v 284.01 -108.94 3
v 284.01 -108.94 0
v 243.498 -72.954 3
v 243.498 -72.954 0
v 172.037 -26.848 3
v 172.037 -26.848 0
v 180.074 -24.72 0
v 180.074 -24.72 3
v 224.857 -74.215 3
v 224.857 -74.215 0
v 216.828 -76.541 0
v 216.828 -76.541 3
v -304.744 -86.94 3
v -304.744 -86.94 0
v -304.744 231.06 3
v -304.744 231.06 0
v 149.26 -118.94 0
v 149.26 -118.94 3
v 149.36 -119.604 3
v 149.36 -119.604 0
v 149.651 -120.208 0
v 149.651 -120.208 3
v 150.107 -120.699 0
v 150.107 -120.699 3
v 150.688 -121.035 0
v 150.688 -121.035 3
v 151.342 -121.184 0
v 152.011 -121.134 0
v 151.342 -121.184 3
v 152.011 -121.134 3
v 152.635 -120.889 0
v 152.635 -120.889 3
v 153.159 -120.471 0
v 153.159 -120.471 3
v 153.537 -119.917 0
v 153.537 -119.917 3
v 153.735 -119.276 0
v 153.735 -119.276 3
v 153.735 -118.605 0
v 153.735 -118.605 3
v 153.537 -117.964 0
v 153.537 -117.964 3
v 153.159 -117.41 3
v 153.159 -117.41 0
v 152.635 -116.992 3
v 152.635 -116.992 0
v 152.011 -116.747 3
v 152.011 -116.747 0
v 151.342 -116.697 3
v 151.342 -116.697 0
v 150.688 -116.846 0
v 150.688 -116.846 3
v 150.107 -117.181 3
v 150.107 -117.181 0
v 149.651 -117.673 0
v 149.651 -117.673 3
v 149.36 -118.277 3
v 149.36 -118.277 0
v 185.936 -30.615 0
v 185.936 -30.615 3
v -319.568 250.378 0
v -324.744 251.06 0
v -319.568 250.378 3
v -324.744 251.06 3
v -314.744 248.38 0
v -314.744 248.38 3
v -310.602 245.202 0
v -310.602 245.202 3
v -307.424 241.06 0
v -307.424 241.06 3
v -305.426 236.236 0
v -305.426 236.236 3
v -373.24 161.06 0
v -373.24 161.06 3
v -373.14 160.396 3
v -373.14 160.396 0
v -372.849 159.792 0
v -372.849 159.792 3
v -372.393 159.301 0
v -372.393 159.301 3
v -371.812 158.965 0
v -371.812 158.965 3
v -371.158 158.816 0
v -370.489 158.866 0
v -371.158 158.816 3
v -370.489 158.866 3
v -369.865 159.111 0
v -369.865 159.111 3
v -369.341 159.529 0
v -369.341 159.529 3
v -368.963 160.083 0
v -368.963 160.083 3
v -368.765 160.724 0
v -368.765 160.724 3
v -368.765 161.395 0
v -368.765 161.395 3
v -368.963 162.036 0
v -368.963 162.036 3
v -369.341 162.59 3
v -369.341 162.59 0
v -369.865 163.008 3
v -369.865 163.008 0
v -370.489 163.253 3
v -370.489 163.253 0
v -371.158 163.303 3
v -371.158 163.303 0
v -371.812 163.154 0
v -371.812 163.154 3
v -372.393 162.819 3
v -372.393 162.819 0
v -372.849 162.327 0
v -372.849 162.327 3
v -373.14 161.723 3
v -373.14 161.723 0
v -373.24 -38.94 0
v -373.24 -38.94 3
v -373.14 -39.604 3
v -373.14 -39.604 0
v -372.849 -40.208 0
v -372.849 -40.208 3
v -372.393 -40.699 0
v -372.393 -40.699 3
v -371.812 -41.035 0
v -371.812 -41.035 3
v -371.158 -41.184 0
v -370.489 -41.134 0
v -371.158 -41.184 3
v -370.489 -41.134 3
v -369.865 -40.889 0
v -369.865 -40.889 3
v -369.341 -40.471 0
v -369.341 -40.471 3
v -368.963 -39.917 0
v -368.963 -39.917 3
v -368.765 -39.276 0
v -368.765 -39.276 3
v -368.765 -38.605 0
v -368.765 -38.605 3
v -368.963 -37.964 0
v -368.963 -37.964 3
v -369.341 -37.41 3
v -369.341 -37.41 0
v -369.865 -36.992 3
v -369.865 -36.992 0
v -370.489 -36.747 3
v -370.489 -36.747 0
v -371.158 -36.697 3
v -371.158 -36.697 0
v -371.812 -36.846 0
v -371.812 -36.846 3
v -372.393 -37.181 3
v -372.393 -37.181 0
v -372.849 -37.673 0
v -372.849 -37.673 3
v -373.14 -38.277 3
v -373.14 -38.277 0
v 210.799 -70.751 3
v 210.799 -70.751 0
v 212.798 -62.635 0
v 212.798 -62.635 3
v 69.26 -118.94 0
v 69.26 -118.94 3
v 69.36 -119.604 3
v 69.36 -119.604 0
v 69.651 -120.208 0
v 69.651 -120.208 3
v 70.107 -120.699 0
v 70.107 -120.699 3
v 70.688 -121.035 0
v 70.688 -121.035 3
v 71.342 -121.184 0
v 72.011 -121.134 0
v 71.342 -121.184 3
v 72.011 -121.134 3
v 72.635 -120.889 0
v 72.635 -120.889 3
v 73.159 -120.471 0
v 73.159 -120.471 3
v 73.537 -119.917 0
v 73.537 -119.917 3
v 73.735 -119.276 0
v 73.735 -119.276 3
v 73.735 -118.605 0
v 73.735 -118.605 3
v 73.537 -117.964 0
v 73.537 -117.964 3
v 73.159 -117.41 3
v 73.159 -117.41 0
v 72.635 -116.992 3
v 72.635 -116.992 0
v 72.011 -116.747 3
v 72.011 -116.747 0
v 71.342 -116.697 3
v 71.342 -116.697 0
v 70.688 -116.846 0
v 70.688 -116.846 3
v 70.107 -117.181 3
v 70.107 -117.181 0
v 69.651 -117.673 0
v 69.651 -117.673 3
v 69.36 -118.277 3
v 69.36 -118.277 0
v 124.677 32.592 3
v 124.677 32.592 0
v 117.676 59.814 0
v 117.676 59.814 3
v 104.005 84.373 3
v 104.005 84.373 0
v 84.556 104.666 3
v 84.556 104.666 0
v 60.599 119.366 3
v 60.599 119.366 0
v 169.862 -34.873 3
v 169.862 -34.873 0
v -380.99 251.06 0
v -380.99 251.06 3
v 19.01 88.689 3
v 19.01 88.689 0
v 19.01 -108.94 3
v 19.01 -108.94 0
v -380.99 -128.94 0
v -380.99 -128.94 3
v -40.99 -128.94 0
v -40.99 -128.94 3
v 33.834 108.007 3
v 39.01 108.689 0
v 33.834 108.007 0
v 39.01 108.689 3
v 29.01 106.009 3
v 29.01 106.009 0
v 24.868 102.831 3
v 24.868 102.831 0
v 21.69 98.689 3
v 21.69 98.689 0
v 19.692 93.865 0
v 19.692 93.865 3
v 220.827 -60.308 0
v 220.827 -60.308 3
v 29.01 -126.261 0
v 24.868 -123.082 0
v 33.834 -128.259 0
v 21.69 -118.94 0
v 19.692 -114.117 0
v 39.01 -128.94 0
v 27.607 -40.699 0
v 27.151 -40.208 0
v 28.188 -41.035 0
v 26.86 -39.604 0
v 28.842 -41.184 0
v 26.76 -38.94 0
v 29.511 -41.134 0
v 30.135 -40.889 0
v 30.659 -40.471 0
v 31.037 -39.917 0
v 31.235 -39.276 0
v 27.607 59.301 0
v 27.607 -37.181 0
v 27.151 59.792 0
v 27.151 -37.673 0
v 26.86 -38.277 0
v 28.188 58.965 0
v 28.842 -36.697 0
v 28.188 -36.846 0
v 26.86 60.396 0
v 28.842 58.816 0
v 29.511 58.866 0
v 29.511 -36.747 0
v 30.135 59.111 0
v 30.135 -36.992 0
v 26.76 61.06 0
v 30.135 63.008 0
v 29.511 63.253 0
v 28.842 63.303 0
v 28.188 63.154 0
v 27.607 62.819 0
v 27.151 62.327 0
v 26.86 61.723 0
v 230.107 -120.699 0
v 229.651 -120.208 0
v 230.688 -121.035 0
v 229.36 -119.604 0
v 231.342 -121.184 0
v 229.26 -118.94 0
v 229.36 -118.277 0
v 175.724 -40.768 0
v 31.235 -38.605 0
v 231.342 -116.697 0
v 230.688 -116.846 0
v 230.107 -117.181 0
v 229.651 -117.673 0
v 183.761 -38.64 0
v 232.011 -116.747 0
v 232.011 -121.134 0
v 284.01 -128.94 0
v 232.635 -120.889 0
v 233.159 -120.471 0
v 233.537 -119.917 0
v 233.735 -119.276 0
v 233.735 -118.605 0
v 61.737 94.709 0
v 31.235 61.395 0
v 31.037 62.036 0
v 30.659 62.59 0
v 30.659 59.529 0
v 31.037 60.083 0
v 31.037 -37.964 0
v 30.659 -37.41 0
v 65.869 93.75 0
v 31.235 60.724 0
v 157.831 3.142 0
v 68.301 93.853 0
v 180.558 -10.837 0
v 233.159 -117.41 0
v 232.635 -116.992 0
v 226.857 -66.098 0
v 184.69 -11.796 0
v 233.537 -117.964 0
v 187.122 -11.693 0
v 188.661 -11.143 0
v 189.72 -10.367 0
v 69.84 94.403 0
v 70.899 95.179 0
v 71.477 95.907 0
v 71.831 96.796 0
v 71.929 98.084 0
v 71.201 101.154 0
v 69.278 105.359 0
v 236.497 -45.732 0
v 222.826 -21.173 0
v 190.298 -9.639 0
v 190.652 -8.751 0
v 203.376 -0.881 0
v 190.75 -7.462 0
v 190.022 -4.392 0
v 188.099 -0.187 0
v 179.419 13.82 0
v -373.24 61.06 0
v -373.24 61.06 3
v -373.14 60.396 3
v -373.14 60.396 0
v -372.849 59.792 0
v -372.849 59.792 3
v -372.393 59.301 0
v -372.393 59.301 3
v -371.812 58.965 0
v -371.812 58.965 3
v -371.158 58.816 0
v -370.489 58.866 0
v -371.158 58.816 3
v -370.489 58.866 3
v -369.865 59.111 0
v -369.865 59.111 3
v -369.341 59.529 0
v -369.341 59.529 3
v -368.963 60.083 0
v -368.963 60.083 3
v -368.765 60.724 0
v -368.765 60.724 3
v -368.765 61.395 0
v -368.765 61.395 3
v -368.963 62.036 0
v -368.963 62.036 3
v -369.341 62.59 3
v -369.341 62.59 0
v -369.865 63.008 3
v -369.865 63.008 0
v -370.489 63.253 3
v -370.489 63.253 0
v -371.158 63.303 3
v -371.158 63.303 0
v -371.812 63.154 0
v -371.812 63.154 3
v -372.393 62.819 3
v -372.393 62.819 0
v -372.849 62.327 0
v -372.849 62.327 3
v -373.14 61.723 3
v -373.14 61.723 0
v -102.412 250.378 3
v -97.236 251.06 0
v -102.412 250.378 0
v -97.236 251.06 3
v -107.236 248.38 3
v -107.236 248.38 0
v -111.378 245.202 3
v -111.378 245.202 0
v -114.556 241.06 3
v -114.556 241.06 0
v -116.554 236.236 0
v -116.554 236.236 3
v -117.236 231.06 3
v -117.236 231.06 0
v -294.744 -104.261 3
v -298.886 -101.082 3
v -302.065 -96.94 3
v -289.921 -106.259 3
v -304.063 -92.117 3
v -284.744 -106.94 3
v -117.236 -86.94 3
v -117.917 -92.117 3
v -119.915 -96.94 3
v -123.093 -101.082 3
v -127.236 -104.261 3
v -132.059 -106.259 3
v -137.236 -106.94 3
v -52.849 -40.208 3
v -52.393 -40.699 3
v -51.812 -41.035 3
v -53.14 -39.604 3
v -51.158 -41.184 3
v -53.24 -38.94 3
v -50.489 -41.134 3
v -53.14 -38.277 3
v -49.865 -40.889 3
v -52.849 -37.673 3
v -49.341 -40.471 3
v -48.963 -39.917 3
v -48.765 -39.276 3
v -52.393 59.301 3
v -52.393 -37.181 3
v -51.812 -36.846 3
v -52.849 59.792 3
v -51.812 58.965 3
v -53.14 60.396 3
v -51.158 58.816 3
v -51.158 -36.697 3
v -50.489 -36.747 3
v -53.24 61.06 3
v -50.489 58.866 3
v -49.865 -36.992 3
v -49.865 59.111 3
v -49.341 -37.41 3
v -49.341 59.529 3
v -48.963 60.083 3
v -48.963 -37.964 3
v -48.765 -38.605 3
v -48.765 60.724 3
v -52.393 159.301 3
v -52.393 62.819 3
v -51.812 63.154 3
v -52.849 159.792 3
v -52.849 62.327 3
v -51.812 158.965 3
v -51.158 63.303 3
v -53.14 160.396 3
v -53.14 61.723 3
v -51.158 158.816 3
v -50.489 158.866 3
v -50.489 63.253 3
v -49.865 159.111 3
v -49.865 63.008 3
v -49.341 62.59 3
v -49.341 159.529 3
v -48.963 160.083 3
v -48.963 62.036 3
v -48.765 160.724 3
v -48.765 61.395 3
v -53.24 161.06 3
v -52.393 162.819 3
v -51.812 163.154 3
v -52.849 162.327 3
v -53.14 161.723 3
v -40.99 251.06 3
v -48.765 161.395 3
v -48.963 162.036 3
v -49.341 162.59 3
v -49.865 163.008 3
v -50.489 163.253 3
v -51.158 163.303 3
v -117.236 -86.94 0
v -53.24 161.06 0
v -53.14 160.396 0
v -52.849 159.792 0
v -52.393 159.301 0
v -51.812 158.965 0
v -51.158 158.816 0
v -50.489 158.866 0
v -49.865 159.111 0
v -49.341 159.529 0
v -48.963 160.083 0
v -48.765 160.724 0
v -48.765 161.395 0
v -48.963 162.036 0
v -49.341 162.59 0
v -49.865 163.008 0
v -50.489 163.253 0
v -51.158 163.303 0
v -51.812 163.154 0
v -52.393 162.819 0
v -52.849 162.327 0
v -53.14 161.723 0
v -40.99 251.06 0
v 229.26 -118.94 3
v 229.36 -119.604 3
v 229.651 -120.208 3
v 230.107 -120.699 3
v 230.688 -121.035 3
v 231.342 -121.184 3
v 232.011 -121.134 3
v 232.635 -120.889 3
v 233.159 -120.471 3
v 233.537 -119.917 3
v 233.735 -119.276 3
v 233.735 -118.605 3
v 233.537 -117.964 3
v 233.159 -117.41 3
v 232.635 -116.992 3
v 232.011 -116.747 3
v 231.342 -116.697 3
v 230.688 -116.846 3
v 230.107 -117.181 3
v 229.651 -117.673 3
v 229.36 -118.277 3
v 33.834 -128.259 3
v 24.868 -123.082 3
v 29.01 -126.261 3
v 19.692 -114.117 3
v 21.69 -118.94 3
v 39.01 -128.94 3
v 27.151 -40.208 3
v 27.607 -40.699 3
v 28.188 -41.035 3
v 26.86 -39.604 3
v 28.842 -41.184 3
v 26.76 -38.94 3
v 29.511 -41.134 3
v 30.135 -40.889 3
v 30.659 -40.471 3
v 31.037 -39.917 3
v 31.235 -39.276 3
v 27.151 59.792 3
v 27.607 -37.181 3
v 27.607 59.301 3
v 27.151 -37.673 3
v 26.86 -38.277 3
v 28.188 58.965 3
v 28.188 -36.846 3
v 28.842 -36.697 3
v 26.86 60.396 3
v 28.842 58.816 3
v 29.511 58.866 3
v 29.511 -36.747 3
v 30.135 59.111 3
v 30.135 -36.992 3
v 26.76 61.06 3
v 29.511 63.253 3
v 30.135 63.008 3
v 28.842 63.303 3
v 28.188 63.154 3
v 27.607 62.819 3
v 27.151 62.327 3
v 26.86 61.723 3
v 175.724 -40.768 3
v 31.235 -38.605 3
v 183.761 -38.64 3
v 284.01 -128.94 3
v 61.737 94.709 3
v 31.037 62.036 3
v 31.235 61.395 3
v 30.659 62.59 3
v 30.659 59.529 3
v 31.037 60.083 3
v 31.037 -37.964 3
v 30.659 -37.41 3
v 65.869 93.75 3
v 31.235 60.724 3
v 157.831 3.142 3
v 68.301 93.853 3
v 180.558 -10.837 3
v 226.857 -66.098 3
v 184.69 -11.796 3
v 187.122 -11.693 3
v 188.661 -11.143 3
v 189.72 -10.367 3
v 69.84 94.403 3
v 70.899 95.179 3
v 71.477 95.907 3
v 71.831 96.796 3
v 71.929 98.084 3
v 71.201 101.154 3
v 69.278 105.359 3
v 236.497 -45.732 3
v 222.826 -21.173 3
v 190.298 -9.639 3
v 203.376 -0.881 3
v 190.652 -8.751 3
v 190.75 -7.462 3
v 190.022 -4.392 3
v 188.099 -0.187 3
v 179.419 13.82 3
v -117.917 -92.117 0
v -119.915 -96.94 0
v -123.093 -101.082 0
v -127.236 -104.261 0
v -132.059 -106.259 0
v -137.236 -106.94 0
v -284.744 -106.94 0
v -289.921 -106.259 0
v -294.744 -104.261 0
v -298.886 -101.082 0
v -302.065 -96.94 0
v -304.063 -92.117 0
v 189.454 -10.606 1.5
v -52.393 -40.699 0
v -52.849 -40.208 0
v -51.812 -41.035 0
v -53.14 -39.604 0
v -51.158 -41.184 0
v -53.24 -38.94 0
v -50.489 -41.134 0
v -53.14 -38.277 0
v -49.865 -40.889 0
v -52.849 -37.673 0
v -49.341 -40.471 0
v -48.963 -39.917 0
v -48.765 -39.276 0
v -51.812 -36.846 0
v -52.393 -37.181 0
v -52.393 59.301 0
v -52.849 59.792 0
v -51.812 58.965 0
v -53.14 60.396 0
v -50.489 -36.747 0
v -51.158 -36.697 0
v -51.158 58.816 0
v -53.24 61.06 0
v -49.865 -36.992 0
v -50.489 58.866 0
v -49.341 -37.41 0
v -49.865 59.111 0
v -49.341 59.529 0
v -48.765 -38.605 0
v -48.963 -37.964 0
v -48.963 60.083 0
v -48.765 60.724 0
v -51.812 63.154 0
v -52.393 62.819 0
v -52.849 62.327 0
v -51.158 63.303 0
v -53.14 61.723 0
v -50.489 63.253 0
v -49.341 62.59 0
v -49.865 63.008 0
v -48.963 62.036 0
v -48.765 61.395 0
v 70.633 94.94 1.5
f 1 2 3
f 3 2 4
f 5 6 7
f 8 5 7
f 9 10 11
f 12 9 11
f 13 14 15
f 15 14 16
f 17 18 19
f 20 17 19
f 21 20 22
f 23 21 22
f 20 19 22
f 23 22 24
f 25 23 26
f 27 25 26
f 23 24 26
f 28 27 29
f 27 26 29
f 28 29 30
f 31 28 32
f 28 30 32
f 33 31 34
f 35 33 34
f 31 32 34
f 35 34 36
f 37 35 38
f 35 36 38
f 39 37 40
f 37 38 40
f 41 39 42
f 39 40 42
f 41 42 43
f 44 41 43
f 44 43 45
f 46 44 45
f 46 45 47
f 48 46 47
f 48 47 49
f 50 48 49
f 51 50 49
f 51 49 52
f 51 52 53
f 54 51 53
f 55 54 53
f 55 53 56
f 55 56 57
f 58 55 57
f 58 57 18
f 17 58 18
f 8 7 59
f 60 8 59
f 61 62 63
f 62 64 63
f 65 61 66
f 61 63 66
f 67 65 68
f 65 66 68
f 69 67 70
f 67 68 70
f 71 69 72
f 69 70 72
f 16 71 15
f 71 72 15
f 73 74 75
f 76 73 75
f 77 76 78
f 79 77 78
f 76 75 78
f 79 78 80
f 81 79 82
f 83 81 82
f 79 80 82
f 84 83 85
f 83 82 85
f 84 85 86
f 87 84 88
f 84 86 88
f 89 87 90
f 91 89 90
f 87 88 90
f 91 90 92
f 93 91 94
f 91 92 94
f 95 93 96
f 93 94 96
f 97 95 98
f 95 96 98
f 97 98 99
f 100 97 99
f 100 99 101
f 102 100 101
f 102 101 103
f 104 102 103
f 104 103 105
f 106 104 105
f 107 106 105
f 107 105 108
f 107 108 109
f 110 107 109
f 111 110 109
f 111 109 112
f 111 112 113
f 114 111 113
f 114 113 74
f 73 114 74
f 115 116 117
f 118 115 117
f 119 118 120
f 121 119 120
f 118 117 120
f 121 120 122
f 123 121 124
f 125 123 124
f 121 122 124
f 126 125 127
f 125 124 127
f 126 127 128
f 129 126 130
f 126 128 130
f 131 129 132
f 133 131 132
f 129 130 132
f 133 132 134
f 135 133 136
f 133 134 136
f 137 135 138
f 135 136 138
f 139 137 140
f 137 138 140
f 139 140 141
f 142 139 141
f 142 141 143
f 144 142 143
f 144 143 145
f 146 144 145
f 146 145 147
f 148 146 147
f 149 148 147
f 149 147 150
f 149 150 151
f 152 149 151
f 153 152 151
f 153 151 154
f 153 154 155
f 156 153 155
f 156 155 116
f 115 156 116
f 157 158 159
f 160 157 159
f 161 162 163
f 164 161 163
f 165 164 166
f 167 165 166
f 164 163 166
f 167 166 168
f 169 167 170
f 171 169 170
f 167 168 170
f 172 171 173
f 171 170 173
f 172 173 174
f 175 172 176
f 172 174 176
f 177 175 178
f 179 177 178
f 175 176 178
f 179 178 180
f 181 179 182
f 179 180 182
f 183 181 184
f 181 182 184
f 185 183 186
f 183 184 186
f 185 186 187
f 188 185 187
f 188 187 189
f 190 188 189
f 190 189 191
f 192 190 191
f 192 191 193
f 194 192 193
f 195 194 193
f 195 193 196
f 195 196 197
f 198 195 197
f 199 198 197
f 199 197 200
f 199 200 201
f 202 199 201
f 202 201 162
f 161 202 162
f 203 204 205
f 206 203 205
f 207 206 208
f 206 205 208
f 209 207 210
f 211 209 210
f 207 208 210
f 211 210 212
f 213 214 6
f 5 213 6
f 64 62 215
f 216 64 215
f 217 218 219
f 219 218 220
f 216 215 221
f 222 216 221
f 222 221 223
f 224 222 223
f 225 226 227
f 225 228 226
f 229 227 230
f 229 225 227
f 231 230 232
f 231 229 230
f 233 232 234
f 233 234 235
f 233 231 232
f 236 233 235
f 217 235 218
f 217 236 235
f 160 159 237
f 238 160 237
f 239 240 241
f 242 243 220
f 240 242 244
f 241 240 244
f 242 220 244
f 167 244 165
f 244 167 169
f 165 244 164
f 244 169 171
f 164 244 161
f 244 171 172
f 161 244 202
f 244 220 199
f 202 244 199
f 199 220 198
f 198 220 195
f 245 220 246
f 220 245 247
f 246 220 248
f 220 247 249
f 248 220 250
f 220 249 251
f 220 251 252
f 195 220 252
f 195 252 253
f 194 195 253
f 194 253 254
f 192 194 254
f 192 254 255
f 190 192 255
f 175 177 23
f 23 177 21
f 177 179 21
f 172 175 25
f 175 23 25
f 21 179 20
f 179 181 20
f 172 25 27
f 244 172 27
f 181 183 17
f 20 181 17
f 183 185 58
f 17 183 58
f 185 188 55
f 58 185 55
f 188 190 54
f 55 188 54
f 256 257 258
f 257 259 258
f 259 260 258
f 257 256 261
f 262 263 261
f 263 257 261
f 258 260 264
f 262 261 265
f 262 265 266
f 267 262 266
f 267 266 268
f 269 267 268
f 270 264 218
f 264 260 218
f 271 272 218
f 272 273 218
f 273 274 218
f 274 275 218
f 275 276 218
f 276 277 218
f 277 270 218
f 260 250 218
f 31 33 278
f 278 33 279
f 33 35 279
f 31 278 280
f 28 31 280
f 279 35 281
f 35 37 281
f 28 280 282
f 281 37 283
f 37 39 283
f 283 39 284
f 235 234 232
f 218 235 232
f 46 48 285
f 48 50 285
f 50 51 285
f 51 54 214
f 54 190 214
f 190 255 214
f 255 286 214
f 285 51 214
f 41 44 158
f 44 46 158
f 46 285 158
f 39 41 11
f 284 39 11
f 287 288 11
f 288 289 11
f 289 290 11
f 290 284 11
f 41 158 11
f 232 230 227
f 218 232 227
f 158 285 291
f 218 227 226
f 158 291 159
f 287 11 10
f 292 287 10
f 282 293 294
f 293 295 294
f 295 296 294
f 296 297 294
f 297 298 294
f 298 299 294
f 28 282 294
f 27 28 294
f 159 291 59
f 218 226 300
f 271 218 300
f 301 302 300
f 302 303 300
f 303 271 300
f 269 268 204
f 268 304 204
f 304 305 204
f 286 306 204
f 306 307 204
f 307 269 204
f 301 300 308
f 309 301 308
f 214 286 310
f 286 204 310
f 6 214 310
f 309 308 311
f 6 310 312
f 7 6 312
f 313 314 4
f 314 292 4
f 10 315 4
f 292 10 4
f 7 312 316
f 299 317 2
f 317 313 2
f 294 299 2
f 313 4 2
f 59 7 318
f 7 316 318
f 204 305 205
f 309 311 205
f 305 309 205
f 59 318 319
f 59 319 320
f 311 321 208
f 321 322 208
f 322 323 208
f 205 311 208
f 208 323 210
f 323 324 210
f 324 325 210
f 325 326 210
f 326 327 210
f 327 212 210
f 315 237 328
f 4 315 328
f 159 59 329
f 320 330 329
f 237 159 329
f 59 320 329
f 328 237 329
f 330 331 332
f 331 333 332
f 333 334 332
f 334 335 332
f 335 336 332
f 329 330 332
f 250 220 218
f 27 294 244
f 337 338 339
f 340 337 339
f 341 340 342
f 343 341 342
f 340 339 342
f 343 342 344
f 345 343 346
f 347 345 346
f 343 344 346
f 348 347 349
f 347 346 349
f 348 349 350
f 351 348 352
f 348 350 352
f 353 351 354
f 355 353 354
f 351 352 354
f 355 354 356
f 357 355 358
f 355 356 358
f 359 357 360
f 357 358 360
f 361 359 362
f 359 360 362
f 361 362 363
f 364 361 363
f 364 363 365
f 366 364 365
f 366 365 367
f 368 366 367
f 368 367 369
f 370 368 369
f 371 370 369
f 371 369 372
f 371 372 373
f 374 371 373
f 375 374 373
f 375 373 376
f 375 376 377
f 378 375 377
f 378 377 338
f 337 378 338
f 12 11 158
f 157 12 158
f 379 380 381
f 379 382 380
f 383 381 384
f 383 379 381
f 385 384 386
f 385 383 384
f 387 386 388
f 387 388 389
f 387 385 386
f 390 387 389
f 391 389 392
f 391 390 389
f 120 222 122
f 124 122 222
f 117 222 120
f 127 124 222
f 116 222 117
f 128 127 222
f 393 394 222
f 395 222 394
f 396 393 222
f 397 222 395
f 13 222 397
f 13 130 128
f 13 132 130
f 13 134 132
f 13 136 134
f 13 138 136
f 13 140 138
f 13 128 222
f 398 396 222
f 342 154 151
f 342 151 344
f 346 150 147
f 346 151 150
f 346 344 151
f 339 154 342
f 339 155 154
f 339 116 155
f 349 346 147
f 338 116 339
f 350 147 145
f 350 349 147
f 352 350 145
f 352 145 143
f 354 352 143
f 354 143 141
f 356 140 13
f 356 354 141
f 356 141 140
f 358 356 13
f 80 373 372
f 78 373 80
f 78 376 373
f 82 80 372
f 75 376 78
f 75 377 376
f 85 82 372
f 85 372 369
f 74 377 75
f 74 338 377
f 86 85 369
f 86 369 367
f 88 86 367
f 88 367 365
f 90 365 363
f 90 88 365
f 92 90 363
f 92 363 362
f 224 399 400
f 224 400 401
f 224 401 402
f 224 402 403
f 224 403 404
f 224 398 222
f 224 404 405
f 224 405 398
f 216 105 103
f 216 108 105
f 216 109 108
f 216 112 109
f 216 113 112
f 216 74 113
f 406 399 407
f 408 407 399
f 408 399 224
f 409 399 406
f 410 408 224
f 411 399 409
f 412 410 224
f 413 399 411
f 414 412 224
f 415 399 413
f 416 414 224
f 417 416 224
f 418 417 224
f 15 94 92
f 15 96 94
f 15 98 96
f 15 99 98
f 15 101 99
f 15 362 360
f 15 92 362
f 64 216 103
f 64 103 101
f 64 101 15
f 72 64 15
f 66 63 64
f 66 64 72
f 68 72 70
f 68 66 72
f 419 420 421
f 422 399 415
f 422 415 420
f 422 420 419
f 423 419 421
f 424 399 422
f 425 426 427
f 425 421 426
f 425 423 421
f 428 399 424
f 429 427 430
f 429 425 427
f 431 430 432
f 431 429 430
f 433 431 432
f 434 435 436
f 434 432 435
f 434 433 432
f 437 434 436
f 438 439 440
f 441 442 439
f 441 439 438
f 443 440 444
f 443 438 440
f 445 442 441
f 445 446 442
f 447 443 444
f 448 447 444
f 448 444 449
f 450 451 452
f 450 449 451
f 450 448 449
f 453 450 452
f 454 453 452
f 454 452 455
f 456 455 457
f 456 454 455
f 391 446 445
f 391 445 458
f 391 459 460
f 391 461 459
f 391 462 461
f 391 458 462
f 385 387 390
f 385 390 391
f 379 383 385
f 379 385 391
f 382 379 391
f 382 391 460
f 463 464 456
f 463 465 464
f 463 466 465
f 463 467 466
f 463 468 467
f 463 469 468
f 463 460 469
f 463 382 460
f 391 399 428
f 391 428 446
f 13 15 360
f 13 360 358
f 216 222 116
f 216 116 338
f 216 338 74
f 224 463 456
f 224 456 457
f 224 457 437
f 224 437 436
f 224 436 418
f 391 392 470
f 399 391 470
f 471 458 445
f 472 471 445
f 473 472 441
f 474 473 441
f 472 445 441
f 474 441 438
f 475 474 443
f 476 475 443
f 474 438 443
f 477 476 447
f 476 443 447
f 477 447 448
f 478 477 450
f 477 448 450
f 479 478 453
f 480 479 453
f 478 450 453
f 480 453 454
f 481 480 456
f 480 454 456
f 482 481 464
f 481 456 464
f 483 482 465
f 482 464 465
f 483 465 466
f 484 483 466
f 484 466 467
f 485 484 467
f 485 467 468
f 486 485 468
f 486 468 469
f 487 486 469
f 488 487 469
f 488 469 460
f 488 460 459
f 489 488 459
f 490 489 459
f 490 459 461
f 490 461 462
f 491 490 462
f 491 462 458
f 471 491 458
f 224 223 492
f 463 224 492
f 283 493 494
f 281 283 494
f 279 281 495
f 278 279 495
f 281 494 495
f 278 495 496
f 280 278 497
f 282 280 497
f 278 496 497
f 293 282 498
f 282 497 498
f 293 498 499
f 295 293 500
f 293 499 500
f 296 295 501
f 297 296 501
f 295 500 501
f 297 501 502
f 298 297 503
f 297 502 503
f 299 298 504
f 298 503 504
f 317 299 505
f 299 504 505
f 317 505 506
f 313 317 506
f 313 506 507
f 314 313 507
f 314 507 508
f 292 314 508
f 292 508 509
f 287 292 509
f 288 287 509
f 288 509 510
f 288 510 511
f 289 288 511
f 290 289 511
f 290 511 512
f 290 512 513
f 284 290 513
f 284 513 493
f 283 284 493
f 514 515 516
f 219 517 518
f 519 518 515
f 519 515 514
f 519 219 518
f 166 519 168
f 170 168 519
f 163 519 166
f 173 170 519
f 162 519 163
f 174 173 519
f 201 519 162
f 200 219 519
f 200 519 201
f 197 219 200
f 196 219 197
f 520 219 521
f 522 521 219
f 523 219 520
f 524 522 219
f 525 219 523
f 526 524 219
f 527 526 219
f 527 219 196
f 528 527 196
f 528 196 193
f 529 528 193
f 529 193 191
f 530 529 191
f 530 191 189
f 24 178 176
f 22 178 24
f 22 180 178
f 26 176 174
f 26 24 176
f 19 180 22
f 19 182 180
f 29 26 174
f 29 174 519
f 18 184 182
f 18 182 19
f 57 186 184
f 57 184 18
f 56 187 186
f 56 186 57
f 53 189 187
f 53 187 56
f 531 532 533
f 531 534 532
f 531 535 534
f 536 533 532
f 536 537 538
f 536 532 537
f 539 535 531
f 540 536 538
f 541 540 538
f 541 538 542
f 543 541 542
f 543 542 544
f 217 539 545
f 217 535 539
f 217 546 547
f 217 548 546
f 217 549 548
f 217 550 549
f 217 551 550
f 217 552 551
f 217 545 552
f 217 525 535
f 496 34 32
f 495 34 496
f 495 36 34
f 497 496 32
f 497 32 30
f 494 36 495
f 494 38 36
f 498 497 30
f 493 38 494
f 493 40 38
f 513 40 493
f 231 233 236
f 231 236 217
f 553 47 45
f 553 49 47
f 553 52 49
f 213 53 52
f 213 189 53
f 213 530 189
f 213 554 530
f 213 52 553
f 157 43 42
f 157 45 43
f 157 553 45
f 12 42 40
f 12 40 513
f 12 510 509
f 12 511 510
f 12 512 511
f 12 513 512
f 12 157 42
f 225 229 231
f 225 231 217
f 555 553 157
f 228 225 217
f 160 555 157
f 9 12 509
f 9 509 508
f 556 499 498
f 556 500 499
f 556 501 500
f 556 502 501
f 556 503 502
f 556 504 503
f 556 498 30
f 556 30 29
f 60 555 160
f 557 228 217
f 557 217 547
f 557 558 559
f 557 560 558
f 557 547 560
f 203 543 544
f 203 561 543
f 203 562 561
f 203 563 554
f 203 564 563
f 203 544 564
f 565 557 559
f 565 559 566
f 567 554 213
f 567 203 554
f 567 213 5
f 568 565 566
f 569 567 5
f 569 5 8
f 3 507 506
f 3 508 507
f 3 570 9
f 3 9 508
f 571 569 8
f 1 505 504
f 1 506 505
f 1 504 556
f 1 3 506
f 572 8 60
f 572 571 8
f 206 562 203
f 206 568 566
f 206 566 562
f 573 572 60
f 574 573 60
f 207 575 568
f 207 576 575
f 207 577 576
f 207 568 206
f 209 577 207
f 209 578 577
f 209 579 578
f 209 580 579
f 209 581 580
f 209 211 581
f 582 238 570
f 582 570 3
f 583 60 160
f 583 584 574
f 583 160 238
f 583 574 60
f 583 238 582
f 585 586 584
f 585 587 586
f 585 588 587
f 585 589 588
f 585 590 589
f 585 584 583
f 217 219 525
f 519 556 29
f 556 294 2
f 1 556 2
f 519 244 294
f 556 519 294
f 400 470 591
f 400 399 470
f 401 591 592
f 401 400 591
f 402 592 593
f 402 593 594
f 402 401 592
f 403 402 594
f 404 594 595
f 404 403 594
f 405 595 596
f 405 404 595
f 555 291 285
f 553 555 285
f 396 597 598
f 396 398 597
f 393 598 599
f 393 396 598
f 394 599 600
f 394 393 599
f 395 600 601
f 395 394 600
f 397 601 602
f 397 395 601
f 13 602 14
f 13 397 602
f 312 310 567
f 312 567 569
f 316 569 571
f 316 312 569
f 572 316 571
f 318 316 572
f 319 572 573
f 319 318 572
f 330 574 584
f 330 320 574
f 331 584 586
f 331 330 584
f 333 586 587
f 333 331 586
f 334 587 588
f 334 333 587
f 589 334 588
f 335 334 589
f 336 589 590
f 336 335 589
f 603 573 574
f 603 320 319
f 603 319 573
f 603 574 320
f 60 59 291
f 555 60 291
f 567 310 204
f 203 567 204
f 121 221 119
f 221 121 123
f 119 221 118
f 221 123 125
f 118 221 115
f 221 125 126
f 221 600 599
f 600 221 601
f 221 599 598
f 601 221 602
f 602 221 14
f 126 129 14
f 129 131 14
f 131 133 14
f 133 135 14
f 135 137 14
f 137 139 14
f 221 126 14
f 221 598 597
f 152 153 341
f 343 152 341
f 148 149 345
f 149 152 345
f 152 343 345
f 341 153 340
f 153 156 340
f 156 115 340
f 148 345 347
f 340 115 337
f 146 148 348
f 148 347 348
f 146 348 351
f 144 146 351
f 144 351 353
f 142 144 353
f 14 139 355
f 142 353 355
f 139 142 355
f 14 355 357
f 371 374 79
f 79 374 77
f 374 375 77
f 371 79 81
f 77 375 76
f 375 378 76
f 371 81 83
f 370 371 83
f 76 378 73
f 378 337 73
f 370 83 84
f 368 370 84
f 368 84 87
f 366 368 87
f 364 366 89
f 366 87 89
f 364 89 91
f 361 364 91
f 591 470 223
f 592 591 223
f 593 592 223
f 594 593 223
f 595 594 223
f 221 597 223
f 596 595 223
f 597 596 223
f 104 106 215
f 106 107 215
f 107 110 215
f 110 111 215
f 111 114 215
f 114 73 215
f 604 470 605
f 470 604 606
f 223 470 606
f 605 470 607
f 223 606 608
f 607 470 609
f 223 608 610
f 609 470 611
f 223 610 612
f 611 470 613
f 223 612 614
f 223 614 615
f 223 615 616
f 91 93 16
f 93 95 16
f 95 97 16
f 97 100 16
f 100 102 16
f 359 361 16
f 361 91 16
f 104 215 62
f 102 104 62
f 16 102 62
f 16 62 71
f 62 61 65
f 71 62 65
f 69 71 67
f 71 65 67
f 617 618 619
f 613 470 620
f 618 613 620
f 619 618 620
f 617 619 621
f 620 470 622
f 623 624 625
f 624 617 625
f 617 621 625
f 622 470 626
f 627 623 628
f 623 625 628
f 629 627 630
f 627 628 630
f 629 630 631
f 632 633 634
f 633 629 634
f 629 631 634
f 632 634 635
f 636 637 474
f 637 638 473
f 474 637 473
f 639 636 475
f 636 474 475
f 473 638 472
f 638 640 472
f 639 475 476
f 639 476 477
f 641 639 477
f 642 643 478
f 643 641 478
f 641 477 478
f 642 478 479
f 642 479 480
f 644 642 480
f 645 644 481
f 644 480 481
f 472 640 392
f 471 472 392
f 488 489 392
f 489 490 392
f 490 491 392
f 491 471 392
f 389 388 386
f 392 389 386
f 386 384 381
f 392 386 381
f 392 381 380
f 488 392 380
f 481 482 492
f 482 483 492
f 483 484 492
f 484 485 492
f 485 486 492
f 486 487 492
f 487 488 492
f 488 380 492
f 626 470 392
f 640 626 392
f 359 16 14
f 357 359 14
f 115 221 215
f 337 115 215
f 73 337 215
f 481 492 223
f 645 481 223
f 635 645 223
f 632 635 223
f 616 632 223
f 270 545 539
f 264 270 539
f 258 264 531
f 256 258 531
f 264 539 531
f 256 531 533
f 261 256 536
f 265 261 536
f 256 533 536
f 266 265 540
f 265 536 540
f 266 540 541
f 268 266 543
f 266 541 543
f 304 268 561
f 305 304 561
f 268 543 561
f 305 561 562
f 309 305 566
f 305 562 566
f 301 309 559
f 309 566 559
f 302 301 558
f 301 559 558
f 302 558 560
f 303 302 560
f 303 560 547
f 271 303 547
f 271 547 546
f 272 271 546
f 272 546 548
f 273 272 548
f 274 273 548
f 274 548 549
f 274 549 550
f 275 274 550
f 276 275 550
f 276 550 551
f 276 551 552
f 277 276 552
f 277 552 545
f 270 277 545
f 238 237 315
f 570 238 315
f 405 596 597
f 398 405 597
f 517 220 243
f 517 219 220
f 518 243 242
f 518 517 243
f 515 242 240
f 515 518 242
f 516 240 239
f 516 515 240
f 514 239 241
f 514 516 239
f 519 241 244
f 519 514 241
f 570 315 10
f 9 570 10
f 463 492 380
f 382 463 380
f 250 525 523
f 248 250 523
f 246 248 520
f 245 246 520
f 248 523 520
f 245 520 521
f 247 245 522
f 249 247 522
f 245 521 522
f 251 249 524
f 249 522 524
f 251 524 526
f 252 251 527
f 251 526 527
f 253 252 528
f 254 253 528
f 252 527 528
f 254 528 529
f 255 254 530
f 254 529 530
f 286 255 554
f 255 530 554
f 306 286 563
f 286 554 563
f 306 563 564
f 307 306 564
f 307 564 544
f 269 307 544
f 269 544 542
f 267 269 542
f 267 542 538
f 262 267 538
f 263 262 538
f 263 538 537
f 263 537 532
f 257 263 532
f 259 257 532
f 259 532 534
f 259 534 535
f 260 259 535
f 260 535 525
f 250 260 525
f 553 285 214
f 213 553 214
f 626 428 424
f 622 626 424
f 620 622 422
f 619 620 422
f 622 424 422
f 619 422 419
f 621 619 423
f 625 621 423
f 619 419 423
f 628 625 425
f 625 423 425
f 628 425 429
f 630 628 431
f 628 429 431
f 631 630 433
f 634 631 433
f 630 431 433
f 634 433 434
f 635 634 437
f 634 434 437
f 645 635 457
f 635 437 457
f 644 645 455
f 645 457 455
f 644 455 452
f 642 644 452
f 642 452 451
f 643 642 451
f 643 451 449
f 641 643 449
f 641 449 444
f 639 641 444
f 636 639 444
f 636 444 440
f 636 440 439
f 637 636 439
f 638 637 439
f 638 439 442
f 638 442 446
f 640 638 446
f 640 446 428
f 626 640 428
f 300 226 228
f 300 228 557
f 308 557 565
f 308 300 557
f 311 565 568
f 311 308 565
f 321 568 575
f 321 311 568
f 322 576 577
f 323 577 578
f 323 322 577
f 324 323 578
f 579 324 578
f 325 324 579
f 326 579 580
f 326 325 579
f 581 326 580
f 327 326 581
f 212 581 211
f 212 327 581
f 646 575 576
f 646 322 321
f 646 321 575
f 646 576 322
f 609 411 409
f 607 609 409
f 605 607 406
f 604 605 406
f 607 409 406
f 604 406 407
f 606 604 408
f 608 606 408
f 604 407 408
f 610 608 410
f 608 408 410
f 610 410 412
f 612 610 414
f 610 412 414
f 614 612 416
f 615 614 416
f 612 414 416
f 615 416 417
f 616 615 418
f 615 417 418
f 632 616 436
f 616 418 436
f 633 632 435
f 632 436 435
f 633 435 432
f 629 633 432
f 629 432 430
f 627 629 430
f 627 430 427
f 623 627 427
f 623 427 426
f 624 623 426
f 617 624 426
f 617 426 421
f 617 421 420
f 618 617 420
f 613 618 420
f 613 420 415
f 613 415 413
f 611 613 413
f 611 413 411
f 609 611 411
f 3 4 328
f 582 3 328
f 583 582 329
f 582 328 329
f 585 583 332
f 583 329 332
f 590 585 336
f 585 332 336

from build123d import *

# Parameters (mm, degrees)
F1_DEPTH   = 3
F2_D       = 4.5
F2_DEPTH   = 50
F2_TIP     = 1.3519363928
F2_2_D     = 4.5
F2_2_DEPTH = 50
F2_2_TIP   = 1.3519363928
F3_R       = 19.99999
F3_2_R     = 19.99999


# Not quite as in the source:
# - a fillet or chamfer is up to 0.001 mm smaller than in the source, because OpenCascade refuses the exact size


with BuildPart() as f1:
    # F0 (on Top) → F1 (new body)
    with BuildSketch(Plane.XY):
        Polygon((-40.9898807008, -128.9403379118), (-40.9898807008, 251.0596620882), (-117.2355602426, 251.0596620882), (-117.2355602426, -106.9403379118), (-304.744201159, -106.9403379118), (-304.744201159, 251.0596620882), (-380.9898807008, 251.0596620882), (-380.9898807008, -128.9403379118), align=None)
    extrude(amount=F1_DEPTH)

    # F2
    with Locations(Plane(origin=(0, 0, 0), x_dir=(1, 0, 0), z_dir=(0, 0, -1))):
        with Locations((29.0101192992, 38.9403379118), (71.5101192992, 118.9403379118), (29.0101192992, -61.0596620882), (29.0101192992, -161.0596620882), (71.5101192992, -241.0596620882), (151.5101192992, -241.0596620882), (231.5101192992, -241.0596620882), (151.5101192992, 118.9403379118), (231.5101192992, 118.9403379118), (-50.9898807008, -161.0596620882), (-50.9898807008, -61.0596620882), (-50.9898807008, 38.9403379118), (-370.9898807008, 38.9403379118), (-370.9898807008, -61.0596620882), (-370.9898807008, -161.0596620882)):
            Hole(F2_D / 2, depth=F2_DEPTH)
            with Locations((0, 0, -(F2_DEPTH + F2_TIP / 2))):  # 118° drill point
                Cone(0, F2_D / 2, F2_TIP, mode=Mode.SUBTRACT)

    # F3 (radius 20 in the source; OpenCascade refuses exactly that, so slightly less here)
    f3_edges = [f1.edges().sort_by_distance(p)[0] for p in [
        (-304.744201, -106.940338, 1.5),
        (-117.23556, -106.940338, 1.5),
        (-304.744201, 251.059662, 1.5),
        (-117.23556, 251.059662, 1.5),
    ]]
    fillet(f3_edges, radius=F3_R)


with BuildPart() as f1b:
    # F0 (on Top) → F1, piece 2 (new body)
    with BuildSketch(Plane.XY):
        with BuildLine():
            Line((39.0101192992, 108.6887940764), (19.0101192992, 108.6887940764))
            Line((19.0101192992, 108.6887940764), (19.0101192992, -128.9403379118))
            Line((19.0101192992, -128.9403379118), (284.0101192992, -128.9403379118))
            Line((284.0101192992, -128.9403379118), (284.0101192992, -108.9403379118))
            Line((284.0101192992, -108.9403379118), (243.4977915589, -72.953959459))
            ThreePointArc((243.4977915589, -72.953959459), (222.8255621797, -21.1730754944), (179.4192635913, 13.8196988242))
            add(Edge.make_bspline(
                [(157.8308492899, 3.1424580353), (178.8720103613, -13.0715758613), (192.9219916812, -13.2550713495), (191.4864058539, -4.0816277466), (179.4192635913, 13.8196988242)],
                knots=[0, 0, 0, 0, 0.5333043536, 1, 1, 1, 1], degree=3))
            Line((157.8308492899, 3.1424580353), (124.6770615683, 32.5923765821))
            ThreePointArc((124.6770615683, 32.5923765821), (104.0048321891, 84.3732605468), (60.5985336006, 119.3660348654))
            add(Edge.make_bspline(
                [(39.0101192992, 108.6887940764), (60.0512803706, 92.4747601798), (74.1012616905, 92.2912646916), (72.6656758632, 101.4647082946), (60.5985336006, 119.3660348654)],
                knots=[0, 0, 0, 0, 0.5333043536, 1, 1, 1, 1], degree=3))
        make_face()
        Polygon((183.7611458661, -38.6397473267), (175.7243851541, -40.7684827608), (169.8624658343, -34.872811537), (172.0373072265, -26.8484048792), (180.0740679385, -24.7196694452), (185.9359872583, -30.6153406689), align=None, mode=Mode.SUBTRACT)
        Polygon((212.7983209623, -62.6349506717), (220.8271718926, -60.3082533353), (226.856576358, -66.0980935359), (224.8571298931, -74.2146310729), (216.8282789629, -76.5413284094), (210.7988744974, -70.7514882088), align=None, mode=Mode.SUBTRACT)
    extrude(amount=F1_DEPTH)

    # F2#2
    with Locations(Plane(origin=(0, 0, 0), x_dir=(1, 0, 0), z_dir=(0, 0, -1))):
        with Locations((29.0101192992, 38.9403379118), (71.5101192992, 118.9403379118), (29.0101192992, -61.0596620882), (29.0101192992, -161.0596620882), (71.5101192992, -241.0596620882), (151.5101192992, -241.0596620882), (231.5101192992, -241.0596620882), (151.5101192992, 118.9403379118), (231.5101192992, 118.9403379118), (-50.9898807008, -161.0596620882), (-50.9898807008, -61.0596620882), (-50.9898807008, 38.9403379118), (-370.9898807008, 38.9403379118), (-370.9898807008, -61.0596620882), (-370.9898807008, -161.0596620882)):
            Hole(F2_2_D / 2, depth=F2_2_DEPTH)
            with Locations((0, 0, -(F2_2_DEPTH + F2_2_TIP / 2))):  # 118° drill point
                Cone(0, F2_2_D / 2, F2_2_TIP, mode=Mode.SUBTRACT)

    # F3#2 (radius 20 in the source; OpenCascade refuses exactly that, so slightly less here)
    f3_2_edges = [f1b.edges().sort_by_distance(p)[0] for p in [
        (19.010119, -128.940338, 1.5),
        (19.010119, 108.688794, 1.5),
    ]]
    fillet(f3_2_edges, radius=F3_2_R)


solid = Compound([f1.part, f1b.part])
